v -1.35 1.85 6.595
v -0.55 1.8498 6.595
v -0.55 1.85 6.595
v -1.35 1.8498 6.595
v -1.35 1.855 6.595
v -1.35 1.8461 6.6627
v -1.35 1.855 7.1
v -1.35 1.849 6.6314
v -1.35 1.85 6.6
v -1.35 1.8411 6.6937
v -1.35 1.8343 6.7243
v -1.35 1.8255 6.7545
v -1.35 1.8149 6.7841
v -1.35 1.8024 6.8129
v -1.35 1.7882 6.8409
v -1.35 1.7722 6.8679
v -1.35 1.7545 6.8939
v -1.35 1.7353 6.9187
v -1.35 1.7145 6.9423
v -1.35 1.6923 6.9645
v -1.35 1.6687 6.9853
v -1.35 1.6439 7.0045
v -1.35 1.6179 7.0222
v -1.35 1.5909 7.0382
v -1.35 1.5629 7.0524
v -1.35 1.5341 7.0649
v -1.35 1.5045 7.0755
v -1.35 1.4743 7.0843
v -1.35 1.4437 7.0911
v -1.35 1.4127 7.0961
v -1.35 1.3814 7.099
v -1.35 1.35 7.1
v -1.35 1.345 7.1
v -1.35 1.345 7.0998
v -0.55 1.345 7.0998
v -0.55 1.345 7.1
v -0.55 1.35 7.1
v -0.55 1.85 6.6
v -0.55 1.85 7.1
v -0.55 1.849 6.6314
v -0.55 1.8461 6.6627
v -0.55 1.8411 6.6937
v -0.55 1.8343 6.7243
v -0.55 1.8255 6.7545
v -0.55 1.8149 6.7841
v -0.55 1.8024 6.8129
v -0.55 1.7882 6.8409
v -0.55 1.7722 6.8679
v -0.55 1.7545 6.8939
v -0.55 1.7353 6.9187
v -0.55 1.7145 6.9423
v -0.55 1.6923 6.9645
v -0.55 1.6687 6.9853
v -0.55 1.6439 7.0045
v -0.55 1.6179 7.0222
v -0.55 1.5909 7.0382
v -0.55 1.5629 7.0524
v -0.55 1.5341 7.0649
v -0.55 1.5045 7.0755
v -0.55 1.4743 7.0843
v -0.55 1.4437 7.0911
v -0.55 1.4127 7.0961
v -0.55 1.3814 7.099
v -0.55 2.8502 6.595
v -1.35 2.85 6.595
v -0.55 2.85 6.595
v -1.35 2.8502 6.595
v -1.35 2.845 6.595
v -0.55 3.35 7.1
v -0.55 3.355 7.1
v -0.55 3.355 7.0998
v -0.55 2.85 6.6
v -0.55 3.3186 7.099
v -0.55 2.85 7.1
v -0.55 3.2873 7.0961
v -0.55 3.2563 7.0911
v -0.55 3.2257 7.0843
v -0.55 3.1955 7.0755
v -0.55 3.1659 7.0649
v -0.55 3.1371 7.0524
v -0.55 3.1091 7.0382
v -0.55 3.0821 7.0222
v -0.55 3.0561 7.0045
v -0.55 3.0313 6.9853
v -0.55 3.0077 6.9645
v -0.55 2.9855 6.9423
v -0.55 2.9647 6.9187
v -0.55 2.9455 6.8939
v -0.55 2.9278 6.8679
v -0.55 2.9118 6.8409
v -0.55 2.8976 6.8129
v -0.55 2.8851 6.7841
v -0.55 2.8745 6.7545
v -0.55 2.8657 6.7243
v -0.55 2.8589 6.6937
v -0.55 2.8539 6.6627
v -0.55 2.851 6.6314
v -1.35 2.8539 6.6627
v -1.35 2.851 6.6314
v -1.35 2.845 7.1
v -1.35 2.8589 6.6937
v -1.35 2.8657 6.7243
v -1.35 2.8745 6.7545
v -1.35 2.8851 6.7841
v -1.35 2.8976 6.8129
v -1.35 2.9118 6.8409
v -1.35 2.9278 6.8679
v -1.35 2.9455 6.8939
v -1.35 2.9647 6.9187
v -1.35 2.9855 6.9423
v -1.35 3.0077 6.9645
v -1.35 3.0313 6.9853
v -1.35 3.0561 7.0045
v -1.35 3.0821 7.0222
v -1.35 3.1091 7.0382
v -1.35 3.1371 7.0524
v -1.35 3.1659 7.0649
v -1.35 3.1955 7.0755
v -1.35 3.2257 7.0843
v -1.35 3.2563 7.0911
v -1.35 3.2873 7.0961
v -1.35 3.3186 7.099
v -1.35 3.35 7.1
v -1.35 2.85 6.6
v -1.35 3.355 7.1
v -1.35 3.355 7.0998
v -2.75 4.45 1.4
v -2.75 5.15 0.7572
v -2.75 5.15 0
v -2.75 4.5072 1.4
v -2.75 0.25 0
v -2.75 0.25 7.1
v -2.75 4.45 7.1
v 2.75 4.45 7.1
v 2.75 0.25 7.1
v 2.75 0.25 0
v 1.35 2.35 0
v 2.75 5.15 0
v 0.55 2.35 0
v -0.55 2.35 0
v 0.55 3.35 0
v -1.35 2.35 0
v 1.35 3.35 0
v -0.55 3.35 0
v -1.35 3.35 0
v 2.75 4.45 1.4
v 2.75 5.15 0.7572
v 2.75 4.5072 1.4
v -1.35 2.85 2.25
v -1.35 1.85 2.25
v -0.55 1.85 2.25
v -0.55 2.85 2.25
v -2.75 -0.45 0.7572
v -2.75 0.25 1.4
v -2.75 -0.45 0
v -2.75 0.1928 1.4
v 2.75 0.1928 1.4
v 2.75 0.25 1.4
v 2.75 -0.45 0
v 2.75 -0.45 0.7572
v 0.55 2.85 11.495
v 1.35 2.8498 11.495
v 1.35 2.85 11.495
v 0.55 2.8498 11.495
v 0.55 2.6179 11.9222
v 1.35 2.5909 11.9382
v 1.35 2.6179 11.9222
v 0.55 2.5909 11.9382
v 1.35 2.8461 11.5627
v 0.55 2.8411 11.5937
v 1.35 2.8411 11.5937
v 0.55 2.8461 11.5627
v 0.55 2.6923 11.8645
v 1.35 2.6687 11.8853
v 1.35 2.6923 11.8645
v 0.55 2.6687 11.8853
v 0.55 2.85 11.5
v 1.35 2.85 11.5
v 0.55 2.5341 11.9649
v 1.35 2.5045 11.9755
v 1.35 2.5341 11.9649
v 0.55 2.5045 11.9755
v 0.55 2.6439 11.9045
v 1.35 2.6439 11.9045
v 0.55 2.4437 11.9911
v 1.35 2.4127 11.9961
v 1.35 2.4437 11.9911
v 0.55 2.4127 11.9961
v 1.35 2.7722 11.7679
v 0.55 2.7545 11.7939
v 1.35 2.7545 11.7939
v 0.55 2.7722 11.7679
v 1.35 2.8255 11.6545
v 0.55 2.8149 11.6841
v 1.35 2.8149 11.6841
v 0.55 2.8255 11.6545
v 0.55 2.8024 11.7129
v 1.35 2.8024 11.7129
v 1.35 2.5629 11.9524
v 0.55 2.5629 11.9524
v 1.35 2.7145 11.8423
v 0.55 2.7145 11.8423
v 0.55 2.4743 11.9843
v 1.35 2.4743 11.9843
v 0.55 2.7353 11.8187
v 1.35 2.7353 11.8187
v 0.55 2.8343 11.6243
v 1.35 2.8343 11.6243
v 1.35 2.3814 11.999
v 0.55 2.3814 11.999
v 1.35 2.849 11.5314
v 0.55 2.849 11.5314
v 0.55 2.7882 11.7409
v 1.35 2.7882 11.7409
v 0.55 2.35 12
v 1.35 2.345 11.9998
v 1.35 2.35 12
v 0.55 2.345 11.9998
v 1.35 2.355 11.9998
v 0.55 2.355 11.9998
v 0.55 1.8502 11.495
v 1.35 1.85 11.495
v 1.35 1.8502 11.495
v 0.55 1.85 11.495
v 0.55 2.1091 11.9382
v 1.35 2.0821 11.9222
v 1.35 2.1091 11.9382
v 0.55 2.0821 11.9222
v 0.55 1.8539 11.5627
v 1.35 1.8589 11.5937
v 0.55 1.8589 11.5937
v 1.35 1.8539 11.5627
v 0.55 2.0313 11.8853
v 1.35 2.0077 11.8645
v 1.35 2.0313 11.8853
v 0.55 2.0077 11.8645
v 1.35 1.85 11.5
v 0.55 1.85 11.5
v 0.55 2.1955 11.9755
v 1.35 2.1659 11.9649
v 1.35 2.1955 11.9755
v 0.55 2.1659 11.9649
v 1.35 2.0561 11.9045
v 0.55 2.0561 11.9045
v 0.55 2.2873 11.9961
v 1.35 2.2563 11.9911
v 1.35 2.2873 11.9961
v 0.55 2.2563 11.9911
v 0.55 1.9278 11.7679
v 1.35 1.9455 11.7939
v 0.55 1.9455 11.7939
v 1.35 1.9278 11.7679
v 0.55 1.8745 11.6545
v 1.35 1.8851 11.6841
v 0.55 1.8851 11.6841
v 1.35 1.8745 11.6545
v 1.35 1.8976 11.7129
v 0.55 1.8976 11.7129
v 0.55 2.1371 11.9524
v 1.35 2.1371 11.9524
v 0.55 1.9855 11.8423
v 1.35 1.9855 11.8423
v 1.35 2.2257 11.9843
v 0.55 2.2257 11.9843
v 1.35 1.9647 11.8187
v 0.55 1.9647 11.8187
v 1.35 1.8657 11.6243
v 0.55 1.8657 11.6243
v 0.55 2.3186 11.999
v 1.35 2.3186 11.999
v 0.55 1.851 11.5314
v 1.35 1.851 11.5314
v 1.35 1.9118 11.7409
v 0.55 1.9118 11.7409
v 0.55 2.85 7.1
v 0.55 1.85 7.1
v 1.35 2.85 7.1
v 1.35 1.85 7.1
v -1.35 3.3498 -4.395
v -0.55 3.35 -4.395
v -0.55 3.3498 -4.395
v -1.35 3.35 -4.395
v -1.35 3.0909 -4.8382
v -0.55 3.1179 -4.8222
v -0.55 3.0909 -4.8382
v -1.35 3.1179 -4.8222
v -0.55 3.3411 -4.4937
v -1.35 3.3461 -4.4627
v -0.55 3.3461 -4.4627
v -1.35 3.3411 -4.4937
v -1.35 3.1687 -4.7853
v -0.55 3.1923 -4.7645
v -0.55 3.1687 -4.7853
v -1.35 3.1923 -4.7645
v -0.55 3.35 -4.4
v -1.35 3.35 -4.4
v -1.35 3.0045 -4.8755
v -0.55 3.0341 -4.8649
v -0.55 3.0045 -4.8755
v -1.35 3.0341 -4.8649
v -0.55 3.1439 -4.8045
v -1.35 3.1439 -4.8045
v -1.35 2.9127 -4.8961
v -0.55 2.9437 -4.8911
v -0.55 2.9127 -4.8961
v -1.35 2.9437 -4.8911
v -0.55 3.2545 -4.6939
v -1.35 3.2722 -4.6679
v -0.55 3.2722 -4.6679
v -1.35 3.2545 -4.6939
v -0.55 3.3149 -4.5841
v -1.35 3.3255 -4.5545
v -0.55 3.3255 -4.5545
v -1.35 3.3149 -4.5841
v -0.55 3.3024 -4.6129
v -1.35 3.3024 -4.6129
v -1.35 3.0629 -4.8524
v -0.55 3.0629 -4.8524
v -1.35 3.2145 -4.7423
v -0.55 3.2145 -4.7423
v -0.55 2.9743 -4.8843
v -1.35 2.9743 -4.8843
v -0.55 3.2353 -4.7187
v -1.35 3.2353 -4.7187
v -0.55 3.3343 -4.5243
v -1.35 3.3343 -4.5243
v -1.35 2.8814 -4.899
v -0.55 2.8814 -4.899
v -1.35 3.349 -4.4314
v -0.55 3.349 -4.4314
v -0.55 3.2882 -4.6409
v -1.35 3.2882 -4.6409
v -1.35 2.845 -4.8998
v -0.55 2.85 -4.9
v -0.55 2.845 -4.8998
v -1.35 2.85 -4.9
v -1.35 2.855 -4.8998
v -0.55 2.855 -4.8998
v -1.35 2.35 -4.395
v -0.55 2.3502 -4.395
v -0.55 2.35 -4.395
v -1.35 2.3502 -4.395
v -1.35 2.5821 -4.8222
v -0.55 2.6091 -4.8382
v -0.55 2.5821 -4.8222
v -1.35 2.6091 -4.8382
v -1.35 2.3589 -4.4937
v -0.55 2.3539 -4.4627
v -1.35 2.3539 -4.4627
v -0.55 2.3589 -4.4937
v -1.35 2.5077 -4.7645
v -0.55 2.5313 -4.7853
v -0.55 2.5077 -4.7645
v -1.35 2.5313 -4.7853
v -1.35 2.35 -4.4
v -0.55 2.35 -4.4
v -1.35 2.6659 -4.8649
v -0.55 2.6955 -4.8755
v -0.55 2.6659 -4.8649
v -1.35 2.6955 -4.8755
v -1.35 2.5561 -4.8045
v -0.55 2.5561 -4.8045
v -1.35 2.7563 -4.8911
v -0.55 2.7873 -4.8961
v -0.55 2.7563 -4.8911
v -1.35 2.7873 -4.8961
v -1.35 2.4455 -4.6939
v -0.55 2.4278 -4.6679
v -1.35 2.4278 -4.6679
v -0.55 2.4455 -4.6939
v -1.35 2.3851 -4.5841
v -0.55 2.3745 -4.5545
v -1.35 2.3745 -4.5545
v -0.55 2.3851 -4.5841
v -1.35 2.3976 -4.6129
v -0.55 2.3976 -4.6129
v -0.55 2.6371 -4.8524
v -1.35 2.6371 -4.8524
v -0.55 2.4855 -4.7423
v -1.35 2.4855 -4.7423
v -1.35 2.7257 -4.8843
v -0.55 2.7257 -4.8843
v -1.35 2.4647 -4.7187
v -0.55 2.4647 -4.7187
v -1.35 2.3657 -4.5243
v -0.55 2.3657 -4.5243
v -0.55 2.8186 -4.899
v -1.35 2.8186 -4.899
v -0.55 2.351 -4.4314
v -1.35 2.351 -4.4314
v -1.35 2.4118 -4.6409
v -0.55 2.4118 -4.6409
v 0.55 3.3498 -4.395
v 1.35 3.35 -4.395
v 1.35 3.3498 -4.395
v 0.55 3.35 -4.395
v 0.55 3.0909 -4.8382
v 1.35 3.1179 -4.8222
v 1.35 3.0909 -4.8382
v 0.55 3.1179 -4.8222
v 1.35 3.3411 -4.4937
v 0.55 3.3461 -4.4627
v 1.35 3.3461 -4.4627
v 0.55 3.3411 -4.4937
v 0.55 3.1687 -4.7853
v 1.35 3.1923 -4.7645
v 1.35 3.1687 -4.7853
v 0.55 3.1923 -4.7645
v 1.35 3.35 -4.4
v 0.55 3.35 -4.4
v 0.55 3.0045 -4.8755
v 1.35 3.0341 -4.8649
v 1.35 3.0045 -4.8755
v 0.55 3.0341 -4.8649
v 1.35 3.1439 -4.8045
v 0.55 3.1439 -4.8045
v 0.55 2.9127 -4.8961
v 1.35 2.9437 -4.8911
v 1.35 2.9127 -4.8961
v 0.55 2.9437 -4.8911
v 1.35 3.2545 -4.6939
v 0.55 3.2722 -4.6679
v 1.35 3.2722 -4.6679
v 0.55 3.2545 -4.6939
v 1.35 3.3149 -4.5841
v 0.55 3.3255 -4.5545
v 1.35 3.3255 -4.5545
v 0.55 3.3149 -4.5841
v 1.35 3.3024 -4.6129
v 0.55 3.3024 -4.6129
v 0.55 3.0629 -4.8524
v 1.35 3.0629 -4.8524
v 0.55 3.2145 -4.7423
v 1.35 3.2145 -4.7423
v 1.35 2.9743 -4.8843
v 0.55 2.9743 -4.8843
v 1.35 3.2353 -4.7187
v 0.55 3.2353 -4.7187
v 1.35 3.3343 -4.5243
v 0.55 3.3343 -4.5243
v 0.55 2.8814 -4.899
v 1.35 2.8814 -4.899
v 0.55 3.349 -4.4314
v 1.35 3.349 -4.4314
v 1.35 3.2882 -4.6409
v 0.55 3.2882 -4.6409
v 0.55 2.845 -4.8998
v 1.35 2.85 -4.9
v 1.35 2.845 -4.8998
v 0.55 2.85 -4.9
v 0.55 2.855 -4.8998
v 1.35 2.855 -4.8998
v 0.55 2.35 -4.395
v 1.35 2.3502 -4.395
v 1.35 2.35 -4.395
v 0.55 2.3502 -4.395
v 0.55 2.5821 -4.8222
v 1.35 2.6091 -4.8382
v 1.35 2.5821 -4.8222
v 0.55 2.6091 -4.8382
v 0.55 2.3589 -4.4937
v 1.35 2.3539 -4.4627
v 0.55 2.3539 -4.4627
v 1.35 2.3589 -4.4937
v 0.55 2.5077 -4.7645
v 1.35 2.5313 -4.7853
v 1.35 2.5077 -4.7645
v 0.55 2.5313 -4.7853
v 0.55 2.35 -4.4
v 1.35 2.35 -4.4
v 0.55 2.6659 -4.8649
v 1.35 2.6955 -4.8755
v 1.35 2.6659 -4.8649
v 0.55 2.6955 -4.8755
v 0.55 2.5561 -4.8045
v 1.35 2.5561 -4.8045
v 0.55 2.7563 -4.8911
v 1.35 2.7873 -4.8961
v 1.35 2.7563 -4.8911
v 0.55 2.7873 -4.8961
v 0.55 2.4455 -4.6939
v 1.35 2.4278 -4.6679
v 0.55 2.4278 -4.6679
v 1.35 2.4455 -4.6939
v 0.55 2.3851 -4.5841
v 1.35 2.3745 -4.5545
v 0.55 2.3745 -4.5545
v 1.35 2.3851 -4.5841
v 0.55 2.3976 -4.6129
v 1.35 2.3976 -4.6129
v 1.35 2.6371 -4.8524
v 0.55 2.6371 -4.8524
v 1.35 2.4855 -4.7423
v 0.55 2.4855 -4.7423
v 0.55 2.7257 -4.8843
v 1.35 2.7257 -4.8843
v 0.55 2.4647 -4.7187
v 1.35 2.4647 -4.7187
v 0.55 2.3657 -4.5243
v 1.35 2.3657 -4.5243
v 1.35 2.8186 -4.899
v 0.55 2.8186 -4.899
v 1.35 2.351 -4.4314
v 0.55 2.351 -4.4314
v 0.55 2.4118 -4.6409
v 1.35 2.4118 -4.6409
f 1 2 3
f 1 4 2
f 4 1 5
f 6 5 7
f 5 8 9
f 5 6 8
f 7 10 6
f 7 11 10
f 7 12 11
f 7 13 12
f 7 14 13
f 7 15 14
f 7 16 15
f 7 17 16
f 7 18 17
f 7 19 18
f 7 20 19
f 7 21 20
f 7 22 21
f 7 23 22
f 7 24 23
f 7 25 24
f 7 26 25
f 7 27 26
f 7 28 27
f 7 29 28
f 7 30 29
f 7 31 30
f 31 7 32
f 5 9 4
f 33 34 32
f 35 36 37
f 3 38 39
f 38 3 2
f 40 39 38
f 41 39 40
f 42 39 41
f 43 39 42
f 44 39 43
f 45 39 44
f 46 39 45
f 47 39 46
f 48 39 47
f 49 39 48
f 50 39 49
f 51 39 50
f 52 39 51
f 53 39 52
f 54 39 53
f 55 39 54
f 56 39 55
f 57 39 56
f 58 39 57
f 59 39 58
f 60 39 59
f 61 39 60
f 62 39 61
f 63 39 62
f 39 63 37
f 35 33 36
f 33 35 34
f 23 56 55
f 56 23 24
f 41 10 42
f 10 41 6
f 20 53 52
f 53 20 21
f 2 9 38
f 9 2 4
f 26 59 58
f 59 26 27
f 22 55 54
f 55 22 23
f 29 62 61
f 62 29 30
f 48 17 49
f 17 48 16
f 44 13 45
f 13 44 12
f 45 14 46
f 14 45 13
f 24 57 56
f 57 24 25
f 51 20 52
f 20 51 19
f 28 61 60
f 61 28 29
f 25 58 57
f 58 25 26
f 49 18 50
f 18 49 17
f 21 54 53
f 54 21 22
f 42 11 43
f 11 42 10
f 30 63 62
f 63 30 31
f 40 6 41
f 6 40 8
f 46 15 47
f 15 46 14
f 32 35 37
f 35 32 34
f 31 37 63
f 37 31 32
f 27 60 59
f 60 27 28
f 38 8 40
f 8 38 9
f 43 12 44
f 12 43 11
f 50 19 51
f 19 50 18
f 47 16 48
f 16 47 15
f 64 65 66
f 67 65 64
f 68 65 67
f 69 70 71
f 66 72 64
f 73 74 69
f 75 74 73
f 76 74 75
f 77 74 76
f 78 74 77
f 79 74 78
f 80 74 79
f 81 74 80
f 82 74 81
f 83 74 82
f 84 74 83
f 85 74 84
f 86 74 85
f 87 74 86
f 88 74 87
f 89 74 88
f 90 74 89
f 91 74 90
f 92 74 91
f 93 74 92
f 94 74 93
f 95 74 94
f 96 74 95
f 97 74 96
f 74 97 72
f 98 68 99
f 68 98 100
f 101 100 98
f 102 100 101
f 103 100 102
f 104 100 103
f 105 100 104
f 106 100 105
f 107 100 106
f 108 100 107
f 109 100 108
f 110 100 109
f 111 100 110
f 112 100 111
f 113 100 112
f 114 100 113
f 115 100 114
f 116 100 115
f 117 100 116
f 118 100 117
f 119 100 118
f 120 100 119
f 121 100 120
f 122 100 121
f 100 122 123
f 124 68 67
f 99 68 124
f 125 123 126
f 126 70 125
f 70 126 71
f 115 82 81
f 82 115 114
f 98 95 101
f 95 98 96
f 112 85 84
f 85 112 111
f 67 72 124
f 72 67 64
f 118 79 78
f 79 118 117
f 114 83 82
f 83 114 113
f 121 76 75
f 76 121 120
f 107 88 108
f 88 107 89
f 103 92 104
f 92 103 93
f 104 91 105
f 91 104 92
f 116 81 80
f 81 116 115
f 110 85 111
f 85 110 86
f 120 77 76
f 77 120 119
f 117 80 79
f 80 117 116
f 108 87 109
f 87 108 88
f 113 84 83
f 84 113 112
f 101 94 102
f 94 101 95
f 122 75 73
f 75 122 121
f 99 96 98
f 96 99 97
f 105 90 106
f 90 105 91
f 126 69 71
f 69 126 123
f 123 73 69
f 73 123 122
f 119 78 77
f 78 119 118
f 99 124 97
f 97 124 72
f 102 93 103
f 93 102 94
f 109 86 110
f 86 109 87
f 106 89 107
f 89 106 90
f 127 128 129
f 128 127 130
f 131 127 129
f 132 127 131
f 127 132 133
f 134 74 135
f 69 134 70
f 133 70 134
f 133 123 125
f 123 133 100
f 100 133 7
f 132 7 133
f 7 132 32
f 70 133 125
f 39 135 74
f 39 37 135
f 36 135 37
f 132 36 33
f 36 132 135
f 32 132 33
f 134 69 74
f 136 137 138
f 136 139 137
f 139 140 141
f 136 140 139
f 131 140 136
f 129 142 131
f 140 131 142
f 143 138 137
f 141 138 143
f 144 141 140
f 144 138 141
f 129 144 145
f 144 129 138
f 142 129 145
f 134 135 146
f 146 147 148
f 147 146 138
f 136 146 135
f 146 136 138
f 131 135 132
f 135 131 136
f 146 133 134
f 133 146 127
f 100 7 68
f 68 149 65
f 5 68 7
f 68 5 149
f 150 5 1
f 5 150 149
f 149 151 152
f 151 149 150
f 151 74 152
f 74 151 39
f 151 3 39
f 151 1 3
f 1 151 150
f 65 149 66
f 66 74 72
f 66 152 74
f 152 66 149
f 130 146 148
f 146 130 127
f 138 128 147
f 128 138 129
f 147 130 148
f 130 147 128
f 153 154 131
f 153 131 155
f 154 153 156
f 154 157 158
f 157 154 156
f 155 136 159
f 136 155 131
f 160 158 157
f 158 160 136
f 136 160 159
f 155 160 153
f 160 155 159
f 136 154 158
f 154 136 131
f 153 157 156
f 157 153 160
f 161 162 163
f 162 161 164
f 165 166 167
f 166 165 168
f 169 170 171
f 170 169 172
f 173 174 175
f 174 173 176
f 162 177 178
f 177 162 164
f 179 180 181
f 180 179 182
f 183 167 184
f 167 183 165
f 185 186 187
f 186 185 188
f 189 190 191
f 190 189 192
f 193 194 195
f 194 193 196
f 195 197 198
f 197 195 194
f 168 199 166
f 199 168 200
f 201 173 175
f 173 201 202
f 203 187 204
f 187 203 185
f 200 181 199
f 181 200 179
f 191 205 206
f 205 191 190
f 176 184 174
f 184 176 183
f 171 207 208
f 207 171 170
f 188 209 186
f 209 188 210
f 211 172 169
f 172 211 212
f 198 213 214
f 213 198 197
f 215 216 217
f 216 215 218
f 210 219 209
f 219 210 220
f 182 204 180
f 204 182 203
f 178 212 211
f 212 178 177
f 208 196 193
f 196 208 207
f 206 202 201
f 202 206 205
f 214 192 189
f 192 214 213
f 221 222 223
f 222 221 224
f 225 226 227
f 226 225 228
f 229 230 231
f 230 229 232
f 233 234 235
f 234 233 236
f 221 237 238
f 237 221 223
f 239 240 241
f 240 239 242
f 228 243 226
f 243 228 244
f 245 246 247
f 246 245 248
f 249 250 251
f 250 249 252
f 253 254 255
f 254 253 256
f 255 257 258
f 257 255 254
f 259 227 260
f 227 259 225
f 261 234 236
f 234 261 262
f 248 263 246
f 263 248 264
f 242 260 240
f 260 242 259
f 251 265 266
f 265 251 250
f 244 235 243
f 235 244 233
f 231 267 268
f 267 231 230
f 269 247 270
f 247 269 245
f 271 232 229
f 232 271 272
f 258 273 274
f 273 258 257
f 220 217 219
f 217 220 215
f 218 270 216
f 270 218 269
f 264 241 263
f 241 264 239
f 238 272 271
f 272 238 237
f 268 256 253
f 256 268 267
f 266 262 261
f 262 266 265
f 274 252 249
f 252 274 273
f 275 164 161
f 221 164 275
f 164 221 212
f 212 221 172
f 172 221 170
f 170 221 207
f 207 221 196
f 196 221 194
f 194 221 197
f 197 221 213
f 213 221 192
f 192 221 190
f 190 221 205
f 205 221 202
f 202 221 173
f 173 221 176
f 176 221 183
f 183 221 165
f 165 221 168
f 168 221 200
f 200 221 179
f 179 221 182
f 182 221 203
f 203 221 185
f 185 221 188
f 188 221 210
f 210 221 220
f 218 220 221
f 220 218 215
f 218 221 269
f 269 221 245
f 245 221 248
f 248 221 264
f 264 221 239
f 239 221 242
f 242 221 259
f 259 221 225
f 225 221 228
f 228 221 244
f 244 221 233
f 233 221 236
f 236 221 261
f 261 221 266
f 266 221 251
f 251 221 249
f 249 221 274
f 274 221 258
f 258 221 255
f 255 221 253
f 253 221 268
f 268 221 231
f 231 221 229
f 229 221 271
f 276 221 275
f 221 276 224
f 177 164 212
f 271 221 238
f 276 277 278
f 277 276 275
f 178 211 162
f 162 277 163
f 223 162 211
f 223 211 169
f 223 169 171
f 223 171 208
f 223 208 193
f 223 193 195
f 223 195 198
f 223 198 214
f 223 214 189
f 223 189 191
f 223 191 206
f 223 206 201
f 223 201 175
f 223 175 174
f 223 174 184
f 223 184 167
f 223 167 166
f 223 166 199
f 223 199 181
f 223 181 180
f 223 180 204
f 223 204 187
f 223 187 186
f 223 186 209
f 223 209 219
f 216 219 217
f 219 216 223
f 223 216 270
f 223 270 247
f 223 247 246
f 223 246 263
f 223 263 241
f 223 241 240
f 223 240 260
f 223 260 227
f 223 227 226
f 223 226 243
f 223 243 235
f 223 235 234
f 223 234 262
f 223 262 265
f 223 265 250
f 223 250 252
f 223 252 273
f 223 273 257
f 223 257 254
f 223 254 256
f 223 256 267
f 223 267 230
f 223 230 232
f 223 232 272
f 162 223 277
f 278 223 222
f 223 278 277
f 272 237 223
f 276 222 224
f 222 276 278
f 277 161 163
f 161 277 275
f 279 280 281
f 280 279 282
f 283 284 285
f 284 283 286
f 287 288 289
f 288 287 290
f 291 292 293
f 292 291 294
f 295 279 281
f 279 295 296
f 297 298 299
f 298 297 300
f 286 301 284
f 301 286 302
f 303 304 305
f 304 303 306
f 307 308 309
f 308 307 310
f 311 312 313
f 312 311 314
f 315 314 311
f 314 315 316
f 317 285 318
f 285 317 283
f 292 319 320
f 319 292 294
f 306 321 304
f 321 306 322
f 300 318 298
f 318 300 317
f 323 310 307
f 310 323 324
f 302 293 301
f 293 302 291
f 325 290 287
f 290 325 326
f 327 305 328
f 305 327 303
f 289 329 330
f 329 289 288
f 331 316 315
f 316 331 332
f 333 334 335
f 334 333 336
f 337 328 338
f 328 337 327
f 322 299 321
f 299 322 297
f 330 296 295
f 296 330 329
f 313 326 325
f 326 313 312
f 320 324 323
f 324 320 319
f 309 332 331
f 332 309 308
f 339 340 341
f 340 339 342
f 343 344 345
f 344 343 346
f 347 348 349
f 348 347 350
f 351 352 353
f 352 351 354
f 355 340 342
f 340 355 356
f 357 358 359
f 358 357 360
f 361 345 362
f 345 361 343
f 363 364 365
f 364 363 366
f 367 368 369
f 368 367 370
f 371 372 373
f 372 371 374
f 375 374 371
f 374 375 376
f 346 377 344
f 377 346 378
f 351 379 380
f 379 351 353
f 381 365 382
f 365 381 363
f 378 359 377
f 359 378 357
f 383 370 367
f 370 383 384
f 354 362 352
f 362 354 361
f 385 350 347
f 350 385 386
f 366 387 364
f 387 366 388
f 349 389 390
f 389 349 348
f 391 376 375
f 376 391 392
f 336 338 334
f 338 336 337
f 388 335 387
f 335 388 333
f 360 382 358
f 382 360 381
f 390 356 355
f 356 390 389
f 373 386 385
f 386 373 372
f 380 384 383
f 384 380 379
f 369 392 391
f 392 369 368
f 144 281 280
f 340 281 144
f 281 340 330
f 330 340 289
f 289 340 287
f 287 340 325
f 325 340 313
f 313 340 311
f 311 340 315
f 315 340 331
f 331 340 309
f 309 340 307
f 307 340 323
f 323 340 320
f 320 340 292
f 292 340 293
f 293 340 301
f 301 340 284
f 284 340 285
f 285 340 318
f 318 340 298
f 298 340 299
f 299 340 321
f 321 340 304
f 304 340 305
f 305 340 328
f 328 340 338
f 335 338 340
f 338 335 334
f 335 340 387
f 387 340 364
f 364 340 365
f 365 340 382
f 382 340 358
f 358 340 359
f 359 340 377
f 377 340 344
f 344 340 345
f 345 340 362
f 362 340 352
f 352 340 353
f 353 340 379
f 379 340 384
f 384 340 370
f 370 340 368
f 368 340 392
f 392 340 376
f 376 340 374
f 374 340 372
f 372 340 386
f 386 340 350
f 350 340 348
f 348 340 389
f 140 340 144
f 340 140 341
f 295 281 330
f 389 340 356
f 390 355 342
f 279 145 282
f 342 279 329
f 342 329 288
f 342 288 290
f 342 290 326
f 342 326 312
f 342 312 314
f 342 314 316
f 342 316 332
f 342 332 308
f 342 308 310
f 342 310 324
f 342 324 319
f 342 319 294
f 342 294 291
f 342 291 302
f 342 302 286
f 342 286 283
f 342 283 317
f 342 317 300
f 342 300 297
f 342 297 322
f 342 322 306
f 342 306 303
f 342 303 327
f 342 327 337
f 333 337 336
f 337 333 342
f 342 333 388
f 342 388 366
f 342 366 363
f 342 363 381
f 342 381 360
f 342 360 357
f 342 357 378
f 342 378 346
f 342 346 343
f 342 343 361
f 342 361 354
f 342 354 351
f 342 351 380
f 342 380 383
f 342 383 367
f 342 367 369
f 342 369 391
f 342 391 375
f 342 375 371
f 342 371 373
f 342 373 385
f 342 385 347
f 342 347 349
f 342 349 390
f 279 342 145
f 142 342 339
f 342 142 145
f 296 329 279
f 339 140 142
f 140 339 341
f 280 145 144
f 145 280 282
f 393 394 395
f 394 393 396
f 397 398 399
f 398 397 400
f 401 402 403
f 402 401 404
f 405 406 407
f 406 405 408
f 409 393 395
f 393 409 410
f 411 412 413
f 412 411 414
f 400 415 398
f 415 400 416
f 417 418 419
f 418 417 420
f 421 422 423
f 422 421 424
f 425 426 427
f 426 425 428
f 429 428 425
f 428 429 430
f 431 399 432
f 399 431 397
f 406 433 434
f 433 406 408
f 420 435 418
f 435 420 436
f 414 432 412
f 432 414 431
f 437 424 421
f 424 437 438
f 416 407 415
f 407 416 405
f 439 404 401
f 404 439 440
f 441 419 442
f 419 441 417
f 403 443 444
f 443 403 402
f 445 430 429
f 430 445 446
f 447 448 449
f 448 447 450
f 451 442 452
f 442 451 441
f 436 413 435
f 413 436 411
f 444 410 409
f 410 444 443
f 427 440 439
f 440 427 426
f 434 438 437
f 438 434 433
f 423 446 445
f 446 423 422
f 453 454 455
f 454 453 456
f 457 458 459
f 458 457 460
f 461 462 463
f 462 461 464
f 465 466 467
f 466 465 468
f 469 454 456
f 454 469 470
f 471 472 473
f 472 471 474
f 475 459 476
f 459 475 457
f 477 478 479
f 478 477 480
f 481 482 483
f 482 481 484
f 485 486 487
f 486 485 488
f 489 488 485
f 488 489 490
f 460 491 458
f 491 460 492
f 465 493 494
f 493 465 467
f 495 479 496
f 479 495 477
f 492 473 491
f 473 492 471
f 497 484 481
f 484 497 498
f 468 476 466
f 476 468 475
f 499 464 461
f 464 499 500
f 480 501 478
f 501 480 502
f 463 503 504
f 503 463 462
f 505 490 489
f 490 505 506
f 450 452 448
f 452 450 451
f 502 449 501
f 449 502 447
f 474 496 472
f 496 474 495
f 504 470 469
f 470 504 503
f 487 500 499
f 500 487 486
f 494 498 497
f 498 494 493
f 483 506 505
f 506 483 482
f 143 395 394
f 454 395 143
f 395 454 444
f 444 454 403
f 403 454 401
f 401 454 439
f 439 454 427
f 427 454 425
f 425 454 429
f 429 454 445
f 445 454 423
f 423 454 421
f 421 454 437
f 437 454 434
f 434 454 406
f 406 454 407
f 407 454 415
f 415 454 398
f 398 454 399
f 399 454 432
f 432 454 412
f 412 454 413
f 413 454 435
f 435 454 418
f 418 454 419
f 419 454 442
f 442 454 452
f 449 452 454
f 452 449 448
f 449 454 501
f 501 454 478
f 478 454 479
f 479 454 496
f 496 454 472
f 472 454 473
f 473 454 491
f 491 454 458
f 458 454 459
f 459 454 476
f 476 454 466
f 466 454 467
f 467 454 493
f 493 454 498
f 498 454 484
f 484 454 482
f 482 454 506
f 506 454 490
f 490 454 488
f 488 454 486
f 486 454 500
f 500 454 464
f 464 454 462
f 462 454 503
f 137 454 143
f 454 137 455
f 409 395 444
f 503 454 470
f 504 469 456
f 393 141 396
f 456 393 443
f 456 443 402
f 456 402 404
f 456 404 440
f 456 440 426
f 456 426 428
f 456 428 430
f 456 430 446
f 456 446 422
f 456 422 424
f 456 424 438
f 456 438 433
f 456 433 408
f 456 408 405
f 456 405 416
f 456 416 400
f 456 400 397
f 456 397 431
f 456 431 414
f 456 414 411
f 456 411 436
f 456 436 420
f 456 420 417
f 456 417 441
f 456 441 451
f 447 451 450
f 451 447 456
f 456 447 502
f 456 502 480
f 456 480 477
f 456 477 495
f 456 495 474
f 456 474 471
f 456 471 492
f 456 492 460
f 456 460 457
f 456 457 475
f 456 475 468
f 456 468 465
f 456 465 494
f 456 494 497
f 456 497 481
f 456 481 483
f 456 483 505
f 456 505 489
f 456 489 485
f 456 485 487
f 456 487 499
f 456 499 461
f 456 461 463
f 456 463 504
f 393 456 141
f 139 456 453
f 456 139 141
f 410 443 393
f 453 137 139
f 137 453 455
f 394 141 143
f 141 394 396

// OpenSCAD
// file: ../Libraries/fillet.scad
/*
 * Create a fillet for a corner.
 * 
 * r = radius of the fillet
 * h = height of the fillet
 *
 * Borrowed from: http://forum.openscad.org/rounded-corners-td3843.html
 */
module fillet(r, h) {
    translate([r / 2, r / 2, 0])

        difference() {
            cube([r + 0.01, r + 0.01, h], center = true);

            translate([r/2, r/2, 0])
                cylinder(r = r, h = h + 1, center = true, $fn=100);

        }
}
// main file
/*
 * Create a Micro Deans Connector.
 *
 * Author: Ian McInerney
 * Created: June 30, 2013
 */

use <../Libraries/fillet.scad>

module baseMolding() {
	difference() {
		translate([0.0,0.35,0.7])cube(size=[5.5,0.7,1.4],center=true);
		translate([0.0,0.7,1.4])rotate([45.0,0.0,0.0])cube(size=[5.8,0.909,1.0],center=true);
	}
}

module Pin() {
	difference() {
		translate([0,0,2.45])cube(size=[0.8,1.0,4.9],center=true);
		translate([0.0,-0.5,4.9])rotate([0.0,90.0,0.0])fillet(r=0.5, h=1.0);
		translate([0.0,0.5,4.9])rotate([0.0,90.0,180.0])fillet(r=0.5, h=1.0);
	}
}





rotate([0.0,0.0,180.0])translate([0.0,-5.15,0.0]) {
	difference() {
		translate([0.0,2.8,3.55])cube(size=[5.5,4.2,7.1], center=true);
		translate([0.95,2.8,4.7])cube(size=[0.8,1.0,4.9],center=true);
		translate([0.95,2.8+0.5,7.1])rotate([0.0,90.0,0.0])fillet(r=0.5, h=0.8);
		translate([0.95,2.8-0.5,7.1])rotate([0.0,90.0,180.0])fillet(r=0.5, h=0.8);
	}
	translate([0.0,0.7,0.0])rotate([0.0,0.0,180.0])baseMolding();
	translate([0.0,4.9,0.0])baseMolding();
	translate([-0.95,2.8,7.1])Pin();
	translate([0.95,2.3,0.0])rotate([0.0,180.0,0.0])Pin();
	translate([-0.95,2.3,0.0])rotate([0.0,180.0,0.0])Pin();
}
